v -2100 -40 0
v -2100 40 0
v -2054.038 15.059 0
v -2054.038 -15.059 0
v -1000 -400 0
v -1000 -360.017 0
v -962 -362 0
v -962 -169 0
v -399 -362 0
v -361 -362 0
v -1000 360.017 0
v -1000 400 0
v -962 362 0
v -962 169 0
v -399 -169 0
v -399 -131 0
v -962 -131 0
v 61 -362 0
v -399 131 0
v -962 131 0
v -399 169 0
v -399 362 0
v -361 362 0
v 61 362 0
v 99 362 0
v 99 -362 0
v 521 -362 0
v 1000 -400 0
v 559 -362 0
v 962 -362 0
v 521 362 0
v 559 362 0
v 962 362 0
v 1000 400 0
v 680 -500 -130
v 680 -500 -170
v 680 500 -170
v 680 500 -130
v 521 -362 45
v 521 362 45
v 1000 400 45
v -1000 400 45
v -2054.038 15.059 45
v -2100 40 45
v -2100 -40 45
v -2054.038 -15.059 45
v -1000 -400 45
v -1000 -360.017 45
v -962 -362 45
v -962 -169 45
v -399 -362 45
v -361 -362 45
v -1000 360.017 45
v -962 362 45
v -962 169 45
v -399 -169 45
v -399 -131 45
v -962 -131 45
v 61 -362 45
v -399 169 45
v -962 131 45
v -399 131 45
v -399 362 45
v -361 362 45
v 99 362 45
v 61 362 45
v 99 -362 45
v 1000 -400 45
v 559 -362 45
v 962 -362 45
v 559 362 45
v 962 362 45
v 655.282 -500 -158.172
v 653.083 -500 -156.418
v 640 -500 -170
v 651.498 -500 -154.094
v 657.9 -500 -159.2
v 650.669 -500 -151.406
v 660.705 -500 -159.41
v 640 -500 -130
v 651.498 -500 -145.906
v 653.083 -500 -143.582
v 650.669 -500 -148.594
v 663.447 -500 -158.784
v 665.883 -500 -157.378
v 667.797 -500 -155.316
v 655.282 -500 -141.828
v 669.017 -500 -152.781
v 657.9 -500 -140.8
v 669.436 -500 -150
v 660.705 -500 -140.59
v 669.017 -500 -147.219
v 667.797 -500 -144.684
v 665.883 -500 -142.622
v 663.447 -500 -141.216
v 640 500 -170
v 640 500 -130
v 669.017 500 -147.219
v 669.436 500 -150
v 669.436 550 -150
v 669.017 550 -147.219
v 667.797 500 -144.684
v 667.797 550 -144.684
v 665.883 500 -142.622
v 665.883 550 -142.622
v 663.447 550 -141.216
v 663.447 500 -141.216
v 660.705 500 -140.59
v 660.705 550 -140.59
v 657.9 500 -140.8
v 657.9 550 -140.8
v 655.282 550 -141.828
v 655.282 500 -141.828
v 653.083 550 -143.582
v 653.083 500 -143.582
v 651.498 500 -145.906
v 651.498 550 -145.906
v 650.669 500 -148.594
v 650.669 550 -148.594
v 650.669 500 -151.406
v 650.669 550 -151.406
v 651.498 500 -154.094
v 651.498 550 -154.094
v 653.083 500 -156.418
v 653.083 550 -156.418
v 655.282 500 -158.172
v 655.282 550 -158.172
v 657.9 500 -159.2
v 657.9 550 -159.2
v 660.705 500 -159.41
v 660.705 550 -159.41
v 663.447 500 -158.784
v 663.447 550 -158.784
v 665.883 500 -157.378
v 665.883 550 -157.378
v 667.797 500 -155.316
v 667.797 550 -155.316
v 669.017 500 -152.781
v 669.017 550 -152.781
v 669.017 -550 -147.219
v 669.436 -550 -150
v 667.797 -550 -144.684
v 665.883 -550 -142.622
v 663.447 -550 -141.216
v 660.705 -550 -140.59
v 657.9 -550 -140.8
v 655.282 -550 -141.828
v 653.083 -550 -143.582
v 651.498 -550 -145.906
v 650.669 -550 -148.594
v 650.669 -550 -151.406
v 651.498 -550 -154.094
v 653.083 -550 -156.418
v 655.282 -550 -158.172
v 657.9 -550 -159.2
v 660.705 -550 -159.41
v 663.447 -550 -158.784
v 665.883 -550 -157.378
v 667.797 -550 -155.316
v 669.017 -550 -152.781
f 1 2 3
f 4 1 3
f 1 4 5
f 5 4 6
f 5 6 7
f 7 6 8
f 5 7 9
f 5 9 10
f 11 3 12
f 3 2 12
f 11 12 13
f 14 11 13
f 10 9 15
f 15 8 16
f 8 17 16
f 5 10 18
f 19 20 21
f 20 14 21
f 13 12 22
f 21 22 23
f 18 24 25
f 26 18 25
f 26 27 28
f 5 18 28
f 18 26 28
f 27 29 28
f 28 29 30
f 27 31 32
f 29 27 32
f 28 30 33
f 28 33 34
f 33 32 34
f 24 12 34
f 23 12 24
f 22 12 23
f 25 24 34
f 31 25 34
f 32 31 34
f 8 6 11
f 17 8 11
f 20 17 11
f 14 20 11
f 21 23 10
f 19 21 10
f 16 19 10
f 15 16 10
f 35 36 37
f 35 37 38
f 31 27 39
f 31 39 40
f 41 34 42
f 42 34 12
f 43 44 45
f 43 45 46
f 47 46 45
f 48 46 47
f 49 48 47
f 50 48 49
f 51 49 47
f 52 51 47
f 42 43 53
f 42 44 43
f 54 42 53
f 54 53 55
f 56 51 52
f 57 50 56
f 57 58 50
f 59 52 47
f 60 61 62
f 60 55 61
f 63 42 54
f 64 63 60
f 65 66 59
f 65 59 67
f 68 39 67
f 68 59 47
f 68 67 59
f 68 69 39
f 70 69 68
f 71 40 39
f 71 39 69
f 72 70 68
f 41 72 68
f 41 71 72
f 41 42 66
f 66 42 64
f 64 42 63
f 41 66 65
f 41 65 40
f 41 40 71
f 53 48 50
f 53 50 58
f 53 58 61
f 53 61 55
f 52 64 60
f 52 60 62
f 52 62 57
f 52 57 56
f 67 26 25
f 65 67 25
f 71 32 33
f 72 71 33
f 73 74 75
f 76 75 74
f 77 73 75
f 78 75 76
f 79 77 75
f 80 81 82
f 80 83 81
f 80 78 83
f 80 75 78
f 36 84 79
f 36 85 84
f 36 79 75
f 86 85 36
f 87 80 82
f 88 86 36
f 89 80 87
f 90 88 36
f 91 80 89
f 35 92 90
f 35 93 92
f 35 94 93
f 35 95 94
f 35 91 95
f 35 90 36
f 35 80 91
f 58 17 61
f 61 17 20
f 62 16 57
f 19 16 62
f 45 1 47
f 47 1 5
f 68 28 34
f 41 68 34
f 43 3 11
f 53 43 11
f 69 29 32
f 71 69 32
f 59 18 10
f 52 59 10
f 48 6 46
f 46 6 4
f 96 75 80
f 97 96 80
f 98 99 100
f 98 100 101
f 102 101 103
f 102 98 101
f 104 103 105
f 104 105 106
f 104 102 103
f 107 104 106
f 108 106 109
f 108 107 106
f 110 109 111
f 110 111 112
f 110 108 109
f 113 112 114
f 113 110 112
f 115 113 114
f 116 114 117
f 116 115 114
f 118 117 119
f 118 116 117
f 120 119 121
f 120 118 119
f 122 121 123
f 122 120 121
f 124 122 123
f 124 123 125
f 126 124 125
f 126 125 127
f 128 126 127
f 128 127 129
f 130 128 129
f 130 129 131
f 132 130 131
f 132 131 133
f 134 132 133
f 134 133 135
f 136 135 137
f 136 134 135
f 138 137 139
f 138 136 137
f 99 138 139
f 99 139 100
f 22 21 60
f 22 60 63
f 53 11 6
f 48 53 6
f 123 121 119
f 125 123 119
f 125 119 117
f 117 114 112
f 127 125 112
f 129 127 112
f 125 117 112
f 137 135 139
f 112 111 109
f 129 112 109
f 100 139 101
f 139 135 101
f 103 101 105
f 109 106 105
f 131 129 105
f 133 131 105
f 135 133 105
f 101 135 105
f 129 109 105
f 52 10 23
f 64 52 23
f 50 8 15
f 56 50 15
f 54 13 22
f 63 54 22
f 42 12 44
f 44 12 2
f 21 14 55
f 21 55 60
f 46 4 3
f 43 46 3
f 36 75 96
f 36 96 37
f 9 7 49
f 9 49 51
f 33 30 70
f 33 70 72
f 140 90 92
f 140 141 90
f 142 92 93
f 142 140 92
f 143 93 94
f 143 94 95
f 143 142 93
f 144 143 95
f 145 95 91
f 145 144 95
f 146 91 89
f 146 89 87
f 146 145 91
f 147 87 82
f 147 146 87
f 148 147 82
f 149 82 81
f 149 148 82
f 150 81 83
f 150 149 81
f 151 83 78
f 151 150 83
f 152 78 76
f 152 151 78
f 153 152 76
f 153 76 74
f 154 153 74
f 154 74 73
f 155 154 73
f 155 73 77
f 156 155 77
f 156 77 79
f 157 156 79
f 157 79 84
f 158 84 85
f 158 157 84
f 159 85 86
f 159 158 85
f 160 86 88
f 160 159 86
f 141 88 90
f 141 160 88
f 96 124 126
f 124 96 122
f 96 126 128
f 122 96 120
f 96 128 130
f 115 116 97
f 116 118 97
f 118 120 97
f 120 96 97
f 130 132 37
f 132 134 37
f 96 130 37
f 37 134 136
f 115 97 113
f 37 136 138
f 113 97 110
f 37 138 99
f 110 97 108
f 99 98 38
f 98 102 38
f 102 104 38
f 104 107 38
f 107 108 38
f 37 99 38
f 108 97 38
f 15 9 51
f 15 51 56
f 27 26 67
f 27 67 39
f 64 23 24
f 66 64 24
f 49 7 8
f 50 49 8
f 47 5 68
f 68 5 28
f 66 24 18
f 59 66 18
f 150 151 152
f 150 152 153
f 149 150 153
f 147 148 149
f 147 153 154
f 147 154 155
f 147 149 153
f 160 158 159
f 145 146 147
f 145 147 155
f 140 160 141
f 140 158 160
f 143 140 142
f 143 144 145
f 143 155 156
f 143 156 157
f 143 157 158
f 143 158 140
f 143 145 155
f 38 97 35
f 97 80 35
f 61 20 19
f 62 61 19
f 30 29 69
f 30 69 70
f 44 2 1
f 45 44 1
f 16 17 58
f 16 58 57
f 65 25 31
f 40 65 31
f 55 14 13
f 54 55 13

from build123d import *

# Parameters (mm, degrees)
F0_W     = 563.0000123978
F0_H     = 193
F0_H_2   = 262
F0_W_2   = 422
F0_H_3   = 724
F0_W_3   = 403
F1_DEPTH = 45
F2_W     = 40
F2_H     = 40
F2_R     = 9.4363088756
F3_DEPTH = 500
F4_DEPTH = 550


# Not quite as in the source:
# - ends of sketch curves that miss each other by under 0.0002 mm in the source are joined


with BuildPart() as f1:
    # F0 (on Top) → F1 (new body)
    with BuildSketch(Plane.XY):
        Polygon((1000, -400), (1000, 400), (-1000, 400), (-2100, 40), (-2100, -40), (-1000, -400), align=None)
        with Locations((-680.4999938011, -265.5)):
            Rectangle(F0_W, F0_H, mode=Mode.SUBTRACT)
        Polygon((-2054.0382862091, 15.0587296583), (-1000, 360.0167142359), (-1000, -360.0167142359), (-2054.0382862091, -15.0587296583), align=None, mode=Mode.SUBTRACT)
        with Locations((-680.4999938011, 0)):
            Rectangle(F0_W, F0_H_2, mode=Mode.SUBTRACT)
        with Locations((-680.4999938011, 265.5)):
            Rectangle(F0_W, F0_H, mode=Mode.SUBTRACT)
        Polygon((-361, -362), (-361, 362), (61, 362.0000114441), (61, -362), align=None, mode=Mode.SUBTRACT)
        with Locations((310, 0)):
            Rectangle(F0_W_2, F0_H_3, mode=Mode.SUBTRACT)
        with Locations((760.5, 0)):
            Rectangle(F0_W_3, F0_H_3, mode=Mode.SUBTRACT)
    extrude(amount=F1_DEPTH)


with BuildPart() as f3:
    # F2 (on Front) → F3 (new body, symmetric)
    with BuildSketch(Plane.XZ):
        with Locations((660, -150)):
            Rectangle(F2_W, F2_H)
        with Locations((660, -150)):
            Circle(F2_R, mode=Mode.SUBTRACT)
    extrude(amount=F3_DEPTH, both=True)

    # F2 (on Front) → F4 (join, symmetric)
    with BuildSketch(Plane.XZ):
        with Locations((660, -150)):
            Circle(F2_R)
    extrude(amount=F4_DEPTH, both=True)


solid = Compound([f1.part, f3.part])
